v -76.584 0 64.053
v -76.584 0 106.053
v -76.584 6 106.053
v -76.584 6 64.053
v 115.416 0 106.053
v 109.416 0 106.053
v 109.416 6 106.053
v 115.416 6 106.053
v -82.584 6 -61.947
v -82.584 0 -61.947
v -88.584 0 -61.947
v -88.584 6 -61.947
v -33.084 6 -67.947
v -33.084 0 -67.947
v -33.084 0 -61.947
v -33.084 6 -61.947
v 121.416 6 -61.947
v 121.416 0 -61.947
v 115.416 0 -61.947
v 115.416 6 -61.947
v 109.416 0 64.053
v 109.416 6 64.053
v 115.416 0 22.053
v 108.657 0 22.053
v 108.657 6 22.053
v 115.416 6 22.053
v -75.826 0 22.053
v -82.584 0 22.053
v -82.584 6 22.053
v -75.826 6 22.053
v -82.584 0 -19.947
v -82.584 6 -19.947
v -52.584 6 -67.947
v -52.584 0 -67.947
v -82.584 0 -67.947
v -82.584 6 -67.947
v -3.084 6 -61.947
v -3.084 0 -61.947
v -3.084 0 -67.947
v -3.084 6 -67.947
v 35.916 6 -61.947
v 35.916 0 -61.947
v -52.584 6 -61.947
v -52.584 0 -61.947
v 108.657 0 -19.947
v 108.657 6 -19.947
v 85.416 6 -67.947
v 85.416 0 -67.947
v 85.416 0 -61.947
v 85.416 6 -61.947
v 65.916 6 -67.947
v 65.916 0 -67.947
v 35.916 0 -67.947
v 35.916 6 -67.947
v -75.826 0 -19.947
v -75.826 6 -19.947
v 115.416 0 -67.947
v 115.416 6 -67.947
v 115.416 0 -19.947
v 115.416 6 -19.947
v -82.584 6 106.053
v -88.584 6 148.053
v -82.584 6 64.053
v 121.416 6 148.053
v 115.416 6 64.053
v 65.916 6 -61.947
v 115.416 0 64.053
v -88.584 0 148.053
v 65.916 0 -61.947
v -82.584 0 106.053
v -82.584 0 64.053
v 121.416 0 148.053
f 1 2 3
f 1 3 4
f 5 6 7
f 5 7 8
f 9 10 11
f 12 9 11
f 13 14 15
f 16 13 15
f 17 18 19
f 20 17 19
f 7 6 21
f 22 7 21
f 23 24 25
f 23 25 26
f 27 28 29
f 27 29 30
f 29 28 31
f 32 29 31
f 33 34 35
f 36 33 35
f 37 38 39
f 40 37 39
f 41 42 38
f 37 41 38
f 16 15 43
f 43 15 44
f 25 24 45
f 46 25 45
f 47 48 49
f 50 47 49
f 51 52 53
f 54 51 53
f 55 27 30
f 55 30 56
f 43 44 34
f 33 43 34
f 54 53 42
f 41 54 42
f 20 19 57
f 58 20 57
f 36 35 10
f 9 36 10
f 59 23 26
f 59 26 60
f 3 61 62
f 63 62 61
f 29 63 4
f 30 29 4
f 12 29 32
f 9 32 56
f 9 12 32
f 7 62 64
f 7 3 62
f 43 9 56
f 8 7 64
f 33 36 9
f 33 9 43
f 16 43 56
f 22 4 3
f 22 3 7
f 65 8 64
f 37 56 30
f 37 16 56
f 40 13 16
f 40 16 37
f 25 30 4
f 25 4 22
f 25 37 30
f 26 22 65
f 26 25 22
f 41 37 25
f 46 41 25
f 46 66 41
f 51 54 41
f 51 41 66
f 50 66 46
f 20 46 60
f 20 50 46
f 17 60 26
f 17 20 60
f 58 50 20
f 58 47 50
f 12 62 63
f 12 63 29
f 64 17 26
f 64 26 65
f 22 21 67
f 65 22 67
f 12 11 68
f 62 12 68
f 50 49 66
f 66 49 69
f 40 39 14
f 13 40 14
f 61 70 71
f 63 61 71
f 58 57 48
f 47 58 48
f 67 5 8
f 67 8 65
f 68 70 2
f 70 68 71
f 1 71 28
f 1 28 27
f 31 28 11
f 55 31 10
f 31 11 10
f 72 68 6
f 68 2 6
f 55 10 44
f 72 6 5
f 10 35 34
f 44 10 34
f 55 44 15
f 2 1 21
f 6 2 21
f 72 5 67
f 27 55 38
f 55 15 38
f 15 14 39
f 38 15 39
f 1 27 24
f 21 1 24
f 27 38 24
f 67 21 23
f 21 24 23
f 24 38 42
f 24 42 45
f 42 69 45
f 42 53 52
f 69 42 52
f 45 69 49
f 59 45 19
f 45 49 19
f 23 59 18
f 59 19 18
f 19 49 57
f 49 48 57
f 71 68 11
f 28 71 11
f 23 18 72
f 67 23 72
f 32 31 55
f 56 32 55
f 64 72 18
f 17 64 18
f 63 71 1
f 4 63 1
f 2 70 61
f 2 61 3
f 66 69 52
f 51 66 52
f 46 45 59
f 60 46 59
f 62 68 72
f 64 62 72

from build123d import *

# Parameters (mm, degrees)
SKETCH1_W           = 6.758532652
SKETCH1_H           = 42
SKETCH1_W_2         = 6
SKETCH1_W_3         = 6.758532653
BOSS_EXTRUDE1_DEPTH = 6


with BuildPart() as part:
    # Sketch1 → Boss-Extrude1 (new body)
    with BuildSketch(Plane(origin=(0, 0, 0), x_dir=(1, 0, 0), z_dir=(0, 1, 0))):
        Polygon((-88.584070796, 61.946902655), (-88.584070796, -148.053097345), (121.415929204, -148.053097345), (121.415929204, 61.946902655), (115.415929204, 61.946902655), (115.415929204, 67.946902655), (85.415929204, 67.946902655), (85.415929204, 61.946902655), (65.915929204, 61.946902655), (65.915929204, 67.946902655), (35.915929204, 67.946902655), (35.915929204, 61.946902655), (-3.084070796, 61.946902655), (-3.084070796, 67.946902655), (-33.084070796, 67.946902655), (-33.084070796, 61.946902655), (-52.584070796, 61.946902655), (-52.584070796, 67.946902655), (-82.584070796, 67.946902655), (-82.584070796, 61.946902655), align=None)
        with Locations((-79.20480447, -1.053097345)):
            Rectangle(SKETCH1_W, SKETCH1_H, mode=Mode.SUBTRACT)
        with Locations((-79.584070796, -85.053097345)):
            Rectangle(SKETCH1_W_2, SKETCH1_H, mode=Mode.SUBTRACT)
        with Locations((112.036662878, -1.053097345)):
            Rectangle(SKETCH1_W_3, SKETCH1_H, mode=Mode.SUBTRACT)
        with Locations((112.415929204, -85.053097345)):
            Rectangle(SKETCH1_W_2, SKETCH1_H, mode=Mode.SUBTRACT)
    extrude(amount=BOSS_EXTRUDE1_DEPTH)


solid = part.part
